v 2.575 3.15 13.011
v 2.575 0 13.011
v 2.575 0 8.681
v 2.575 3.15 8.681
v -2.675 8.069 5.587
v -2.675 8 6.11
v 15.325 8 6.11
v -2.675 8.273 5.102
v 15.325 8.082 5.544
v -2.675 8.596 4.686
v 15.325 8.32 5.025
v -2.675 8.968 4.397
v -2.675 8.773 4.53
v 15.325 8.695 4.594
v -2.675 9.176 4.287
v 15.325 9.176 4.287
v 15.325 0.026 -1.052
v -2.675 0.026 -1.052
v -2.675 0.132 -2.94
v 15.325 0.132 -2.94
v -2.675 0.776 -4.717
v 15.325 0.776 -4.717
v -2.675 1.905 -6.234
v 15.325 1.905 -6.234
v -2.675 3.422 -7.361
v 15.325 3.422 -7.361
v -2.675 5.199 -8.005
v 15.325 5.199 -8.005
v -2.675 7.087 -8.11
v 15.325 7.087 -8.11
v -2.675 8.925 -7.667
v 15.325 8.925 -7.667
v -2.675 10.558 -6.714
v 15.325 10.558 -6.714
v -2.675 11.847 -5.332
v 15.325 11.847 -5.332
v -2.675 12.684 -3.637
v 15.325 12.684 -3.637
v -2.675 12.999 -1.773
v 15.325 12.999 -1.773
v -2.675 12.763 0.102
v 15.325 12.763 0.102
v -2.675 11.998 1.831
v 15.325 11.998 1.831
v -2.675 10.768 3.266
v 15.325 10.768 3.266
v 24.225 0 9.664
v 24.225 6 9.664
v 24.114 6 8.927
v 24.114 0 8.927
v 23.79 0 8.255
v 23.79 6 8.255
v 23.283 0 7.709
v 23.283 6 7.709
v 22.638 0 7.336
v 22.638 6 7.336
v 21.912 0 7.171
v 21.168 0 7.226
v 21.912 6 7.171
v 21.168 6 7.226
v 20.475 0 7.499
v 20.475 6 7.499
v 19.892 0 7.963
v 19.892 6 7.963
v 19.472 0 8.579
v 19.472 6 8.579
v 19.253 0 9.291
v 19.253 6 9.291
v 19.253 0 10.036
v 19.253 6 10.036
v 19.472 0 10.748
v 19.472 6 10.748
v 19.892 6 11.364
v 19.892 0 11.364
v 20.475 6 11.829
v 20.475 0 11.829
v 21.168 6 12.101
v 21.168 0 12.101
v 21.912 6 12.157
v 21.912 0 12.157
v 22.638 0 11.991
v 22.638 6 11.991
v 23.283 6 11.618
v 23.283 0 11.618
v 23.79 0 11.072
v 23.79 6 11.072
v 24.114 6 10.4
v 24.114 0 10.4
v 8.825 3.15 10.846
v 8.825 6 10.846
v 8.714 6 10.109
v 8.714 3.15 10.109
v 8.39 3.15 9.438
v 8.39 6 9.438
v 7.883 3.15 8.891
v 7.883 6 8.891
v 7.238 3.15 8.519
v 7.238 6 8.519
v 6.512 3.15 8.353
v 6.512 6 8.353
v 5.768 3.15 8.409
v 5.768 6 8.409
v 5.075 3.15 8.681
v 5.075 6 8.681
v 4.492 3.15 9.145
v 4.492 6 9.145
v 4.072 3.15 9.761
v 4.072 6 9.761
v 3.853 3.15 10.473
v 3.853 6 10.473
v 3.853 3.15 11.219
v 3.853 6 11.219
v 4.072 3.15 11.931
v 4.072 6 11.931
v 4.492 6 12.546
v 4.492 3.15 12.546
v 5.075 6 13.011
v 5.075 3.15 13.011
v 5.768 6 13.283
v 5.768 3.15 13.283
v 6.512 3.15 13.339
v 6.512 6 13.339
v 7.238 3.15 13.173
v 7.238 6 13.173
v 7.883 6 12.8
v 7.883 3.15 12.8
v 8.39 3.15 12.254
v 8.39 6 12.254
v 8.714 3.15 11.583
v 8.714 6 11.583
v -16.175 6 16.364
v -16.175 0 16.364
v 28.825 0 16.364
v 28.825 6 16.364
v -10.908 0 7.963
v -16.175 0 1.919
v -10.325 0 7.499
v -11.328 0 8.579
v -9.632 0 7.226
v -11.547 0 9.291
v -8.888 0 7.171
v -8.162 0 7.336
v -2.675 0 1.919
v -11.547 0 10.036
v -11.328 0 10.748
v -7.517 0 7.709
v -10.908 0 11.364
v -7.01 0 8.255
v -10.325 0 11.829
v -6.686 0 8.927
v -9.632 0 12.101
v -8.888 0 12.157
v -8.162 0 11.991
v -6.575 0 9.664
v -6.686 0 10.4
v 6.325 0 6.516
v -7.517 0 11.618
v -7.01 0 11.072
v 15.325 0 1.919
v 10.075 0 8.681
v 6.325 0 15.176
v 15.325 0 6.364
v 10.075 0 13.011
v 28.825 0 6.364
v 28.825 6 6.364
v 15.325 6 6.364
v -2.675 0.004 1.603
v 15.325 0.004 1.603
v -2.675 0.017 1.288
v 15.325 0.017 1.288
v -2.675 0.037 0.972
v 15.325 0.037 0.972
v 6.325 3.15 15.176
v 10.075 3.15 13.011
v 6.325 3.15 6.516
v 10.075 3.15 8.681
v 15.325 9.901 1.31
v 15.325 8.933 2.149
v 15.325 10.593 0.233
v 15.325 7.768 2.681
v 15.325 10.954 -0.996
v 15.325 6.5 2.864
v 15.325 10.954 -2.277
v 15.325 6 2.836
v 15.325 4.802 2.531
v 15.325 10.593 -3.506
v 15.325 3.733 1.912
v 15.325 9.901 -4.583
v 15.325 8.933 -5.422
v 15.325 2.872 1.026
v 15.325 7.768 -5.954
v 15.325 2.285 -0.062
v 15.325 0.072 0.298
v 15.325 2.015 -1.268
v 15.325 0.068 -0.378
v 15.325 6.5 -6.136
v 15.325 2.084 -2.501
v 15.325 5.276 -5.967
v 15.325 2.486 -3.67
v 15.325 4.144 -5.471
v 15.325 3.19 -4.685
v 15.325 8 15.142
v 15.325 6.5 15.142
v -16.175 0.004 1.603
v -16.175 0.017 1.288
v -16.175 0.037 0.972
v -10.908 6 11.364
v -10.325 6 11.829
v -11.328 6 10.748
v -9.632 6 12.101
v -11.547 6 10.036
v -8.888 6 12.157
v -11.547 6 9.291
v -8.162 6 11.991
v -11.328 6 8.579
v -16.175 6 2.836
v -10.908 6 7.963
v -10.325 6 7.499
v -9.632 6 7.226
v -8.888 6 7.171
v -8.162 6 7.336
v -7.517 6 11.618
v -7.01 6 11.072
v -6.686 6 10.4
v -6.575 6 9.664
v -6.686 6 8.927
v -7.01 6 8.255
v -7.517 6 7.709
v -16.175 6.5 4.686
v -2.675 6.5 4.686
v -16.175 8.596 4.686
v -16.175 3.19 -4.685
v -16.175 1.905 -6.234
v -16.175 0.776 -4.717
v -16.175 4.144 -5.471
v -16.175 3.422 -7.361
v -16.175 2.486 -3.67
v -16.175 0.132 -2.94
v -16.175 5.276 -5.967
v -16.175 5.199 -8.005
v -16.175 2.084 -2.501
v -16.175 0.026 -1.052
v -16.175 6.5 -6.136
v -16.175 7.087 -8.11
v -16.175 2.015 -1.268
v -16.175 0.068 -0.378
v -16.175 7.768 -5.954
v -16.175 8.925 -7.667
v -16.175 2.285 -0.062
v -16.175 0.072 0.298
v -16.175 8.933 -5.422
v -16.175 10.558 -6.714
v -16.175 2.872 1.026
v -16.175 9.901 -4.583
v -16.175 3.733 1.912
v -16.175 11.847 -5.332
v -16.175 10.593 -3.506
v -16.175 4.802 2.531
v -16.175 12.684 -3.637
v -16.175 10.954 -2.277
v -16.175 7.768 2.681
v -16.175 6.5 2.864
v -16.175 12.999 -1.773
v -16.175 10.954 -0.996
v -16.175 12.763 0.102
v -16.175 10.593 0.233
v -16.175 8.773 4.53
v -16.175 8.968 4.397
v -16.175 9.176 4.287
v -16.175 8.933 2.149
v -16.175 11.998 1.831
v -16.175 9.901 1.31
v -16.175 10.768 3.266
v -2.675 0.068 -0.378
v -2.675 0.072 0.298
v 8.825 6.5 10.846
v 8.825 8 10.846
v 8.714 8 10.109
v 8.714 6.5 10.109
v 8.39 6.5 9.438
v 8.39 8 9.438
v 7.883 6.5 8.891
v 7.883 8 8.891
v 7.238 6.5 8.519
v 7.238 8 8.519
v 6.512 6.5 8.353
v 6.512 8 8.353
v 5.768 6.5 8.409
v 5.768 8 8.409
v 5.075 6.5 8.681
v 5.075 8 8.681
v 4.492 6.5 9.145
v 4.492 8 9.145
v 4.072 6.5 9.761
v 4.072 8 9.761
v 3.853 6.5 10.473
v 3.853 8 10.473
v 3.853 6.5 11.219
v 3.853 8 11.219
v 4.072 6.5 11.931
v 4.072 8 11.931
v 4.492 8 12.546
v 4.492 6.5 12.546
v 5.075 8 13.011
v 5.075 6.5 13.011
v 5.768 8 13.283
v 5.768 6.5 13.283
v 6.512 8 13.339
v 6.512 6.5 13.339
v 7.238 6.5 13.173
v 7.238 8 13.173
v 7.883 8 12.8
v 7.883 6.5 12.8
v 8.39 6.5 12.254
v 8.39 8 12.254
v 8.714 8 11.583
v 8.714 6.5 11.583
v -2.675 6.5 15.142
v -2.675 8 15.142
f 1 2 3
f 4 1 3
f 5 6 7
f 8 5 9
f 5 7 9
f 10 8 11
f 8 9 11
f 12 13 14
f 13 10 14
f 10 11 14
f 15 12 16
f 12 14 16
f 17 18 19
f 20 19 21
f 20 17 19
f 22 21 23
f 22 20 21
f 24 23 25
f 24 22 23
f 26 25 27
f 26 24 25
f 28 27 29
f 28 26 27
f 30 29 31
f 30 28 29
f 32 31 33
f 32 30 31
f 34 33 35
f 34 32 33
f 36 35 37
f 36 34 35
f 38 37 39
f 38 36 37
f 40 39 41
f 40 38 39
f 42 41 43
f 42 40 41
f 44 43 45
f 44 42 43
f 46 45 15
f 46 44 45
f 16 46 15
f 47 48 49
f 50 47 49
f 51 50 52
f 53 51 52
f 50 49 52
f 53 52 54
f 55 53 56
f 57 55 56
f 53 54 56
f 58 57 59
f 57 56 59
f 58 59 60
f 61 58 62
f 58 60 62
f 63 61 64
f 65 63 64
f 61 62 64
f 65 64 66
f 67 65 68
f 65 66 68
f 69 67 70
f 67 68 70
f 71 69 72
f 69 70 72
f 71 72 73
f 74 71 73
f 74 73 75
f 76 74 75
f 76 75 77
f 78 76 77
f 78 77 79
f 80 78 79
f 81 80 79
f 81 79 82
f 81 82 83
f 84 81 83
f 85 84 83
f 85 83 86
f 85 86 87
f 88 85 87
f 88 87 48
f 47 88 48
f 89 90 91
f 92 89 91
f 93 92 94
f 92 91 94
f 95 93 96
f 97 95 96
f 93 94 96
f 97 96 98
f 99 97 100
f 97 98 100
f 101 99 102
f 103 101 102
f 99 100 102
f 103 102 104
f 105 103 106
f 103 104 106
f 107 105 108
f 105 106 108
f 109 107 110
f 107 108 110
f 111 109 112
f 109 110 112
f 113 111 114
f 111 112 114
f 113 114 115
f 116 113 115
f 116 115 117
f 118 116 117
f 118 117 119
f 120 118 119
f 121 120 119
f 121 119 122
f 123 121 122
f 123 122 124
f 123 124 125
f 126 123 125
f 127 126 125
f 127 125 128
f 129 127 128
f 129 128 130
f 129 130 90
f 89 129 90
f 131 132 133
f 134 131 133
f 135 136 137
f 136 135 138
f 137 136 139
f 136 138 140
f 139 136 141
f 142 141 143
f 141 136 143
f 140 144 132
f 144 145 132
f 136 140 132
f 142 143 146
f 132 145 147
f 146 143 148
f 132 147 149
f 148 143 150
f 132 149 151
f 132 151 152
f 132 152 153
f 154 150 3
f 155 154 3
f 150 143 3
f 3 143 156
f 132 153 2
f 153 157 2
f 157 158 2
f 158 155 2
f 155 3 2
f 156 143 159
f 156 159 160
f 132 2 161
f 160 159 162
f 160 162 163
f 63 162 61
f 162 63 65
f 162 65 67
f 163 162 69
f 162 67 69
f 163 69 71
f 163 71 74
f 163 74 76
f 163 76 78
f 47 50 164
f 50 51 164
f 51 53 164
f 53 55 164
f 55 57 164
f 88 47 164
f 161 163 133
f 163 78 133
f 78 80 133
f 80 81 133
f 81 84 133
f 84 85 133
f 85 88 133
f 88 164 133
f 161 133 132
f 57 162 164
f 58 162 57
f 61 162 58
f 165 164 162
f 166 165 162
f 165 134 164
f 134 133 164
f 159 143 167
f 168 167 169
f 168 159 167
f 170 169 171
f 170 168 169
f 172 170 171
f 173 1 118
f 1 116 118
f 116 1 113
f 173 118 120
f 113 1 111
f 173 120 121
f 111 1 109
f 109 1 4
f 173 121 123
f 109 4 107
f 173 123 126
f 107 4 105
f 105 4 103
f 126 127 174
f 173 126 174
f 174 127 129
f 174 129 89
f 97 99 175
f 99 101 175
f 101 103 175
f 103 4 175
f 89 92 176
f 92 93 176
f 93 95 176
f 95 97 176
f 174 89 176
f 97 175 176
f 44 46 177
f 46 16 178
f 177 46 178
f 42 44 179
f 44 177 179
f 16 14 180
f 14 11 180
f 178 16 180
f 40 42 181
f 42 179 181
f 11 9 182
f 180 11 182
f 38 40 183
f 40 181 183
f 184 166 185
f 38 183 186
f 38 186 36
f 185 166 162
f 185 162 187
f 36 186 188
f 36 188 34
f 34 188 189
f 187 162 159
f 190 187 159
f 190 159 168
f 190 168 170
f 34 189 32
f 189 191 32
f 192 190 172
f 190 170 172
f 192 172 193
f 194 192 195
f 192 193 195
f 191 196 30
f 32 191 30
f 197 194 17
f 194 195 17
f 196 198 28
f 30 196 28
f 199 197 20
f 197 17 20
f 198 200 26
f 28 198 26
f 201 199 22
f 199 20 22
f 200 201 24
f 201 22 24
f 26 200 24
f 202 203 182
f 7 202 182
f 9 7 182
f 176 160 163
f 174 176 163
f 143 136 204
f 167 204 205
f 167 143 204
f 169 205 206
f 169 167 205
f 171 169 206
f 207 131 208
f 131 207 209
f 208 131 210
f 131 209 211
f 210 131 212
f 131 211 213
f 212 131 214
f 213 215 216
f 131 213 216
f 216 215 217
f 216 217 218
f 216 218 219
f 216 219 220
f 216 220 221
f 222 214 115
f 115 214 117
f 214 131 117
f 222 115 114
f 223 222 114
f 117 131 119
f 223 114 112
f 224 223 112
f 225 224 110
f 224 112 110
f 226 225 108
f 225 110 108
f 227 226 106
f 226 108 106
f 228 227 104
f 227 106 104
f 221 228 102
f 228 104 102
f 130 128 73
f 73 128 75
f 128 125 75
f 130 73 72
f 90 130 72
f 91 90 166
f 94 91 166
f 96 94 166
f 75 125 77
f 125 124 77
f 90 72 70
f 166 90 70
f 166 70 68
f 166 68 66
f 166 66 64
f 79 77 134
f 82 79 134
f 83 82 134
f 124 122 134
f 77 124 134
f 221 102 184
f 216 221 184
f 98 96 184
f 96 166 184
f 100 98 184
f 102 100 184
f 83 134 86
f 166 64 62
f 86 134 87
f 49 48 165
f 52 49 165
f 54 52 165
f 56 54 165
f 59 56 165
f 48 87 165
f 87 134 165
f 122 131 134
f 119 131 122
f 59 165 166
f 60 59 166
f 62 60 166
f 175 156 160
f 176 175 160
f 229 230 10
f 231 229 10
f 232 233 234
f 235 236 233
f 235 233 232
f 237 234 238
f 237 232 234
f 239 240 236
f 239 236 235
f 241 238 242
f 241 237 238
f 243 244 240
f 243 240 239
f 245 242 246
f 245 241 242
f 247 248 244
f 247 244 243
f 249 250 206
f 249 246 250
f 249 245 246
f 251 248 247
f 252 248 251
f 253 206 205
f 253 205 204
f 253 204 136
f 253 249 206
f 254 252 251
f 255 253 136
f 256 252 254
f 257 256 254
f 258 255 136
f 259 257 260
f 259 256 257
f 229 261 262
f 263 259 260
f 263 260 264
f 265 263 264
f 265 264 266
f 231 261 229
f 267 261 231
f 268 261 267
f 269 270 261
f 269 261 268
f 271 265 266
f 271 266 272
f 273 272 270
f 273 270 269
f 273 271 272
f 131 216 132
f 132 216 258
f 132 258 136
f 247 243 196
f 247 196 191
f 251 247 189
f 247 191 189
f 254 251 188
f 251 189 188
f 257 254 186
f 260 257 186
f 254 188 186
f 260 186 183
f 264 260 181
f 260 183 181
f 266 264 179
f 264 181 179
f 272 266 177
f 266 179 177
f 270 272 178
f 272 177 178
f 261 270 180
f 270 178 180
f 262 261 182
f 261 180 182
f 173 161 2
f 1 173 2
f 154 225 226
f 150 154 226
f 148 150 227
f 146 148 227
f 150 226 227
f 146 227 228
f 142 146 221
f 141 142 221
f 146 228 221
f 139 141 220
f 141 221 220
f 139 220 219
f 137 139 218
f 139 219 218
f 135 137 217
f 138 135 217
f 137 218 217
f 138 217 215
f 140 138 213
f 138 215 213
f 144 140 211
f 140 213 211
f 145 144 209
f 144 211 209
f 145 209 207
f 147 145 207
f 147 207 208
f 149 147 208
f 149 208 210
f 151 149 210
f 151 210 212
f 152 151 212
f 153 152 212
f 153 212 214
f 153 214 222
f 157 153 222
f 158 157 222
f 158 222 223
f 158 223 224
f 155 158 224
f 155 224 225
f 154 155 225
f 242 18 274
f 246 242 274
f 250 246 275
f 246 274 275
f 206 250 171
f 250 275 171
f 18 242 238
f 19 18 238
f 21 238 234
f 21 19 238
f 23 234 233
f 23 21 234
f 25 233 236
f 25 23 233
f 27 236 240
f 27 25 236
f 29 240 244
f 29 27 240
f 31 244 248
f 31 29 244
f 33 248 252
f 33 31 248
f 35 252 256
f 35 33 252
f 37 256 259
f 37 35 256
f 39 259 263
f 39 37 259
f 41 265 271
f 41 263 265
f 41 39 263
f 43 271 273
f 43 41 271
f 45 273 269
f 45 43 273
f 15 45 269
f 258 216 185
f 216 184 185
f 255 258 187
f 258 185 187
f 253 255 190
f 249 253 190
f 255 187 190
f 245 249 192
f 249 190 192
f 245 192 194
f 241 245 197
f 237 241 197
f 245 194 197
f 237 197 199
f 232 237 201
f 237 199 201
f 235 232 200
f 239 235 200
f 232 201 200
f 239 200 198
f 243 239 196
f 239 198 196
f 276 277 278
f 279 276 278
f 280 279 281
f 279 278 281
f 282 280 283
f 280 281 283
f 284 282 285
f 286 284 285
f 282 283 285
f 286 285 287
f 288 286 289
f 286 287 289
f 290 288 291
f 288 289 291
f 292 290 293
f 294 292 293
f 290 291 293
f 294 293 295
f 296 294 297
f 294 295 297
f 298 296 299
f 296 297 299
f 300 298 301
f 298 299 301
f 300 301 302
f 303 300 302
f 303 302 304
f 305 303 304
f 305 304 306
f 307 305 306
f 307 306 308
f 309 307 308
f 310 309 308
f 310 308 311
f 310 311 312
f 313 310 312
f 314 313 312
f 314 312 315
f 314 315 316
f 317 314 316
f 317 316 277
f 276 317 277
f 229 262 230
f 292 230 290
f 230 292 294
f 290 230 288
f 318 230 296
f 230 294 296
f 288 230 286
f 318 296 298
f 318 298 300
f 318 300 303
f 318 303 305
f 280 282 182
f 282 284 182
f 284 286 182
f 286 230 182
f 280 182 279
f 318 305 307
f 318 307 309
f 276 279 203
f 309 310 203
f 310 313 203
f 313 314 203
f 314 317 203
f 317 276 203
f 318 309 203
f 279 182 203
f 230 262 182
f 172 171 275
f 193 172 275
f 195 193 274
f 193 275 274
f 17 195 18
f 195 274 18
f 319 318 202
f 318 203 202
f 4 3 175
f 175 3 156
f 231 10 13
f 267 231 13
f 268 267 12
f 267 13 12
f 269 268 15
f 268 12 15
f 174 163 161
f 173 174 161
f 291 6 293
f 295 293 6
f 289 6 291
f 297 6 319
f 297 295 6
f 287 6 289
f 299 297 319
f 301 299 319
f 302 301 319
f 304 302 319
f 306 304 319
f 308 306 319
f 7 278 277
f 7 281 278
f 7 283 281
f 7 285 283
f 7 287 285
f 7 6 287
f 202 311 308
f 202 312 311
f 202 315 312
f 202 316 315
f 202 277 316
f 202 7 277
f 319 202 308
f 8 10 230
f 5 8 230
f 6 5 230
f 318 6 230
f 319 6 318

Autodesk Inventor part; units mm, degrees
sketch "Sketch1" plane through (0, 0, 0) normal (0, 1, 0) x (-1, 0, 0)
  line L0 (16.1753, 16.3636) -> (-28.8247, 16.3636)
  line L1 (-28.8247, 16.3636) -> (-28.8247, 6.3636)
  line L2 (16.1753, 6.3636) -> (16.1753, 16.3636)
  line L3 (-17.8247, 6.3636) -> (-17.8247, 1.3636)
  line L4 (-17.8247, 1.3636) -> (5.1753, 1.3636)
  line L5 (5.1753, 1.3636) -> (5.1753, 6.3636)
  line L6 (-28.8247, 6.3636) -> (-17.8247, 6.3636)
  line L7 (5.1753, 6.3636) -> (16.1753, 6.3636)
  point P0 (0, 0)
  dimension "d4" = 45
  dimension "d5" = 5
  dimension "d6" = 5
  dimension "d7" = 11
  dimension "d8" = 11
  dimension "d9" = 23
  dimension "d10" = 10
extrude "Extrusion1" add sketch "Sketch1" along normal blind 6
sketch "Sketch4" plane through (17.8247, 0, 6.3636) normal (1, 0, 0) x (0, 0, -1)
  circle A0 centre (8, 6.5) radius 6.5
  line L0 (0, 6) -> (5, 6) projected
  line L1 (0, 0) -> (0, 6) projected
  line L2 (0, 0) -> (5, 0) projected
  line L3 (5, 0) -> (16.9814, 0)
  point P0 (6.3636, 0)
  dimension "d20" = 13
  dimension "d36" = 8
extrude "Extrusion4" add sketch "Sketch4" against normal up to surface (23 mm away) contours A0
fillet "Fillet1" radius 12 2 edges at (6.3247, 0.7337, 1.3636) (6.3247, 0, 1.3636)
sketch "Sketch5" plane through (17.8247, 0, 6.3636) normal (1, 0, 0) x (0, 0, -1)
  circle A0 centre (8, 6.5) radius 6.5 projected
  circle A1 centre (8, 6.5) radius 2.5
  point P0 (6.3636, 0)
  point P1 (1.5193, 6)
  point P2 (7.416, 0.0263)
  dimension "d27" = 5
extrude "Extrusion5" cut sketch "Sketch5" against normal through all contours A1
ref_plane "Work Plane1" through (17.8247, 6.5, -8.1364) normal (0, 0, 1) x (1, 0, 0)
sketch "Sketch6" plane through (0, 6, 0) normal (0, 1, 0) x (1, 0, 0)
  circle A0 centre (-9.0753, -9.6636) radius 2.5
  circle A1 centre (21.7247, -9.6636) radius 2.5
  line L0 (37.8247, 8.1364) -> (-25.1753, 8.1364) projected
  line L1 (28.8247, -16.3636) -> (28.8247, -6.3636) projected
  line L2 (-16.1753, -6.3636) -> (-16.1753, -16.3636) projected
  point P0 (0, 0)
  dimension "d33" = 5
  dimension "d34" = 5
  dimension "d35" = 17.8
  dimension "d37" = 17.8
  dimension "d38" = 7.1
  dimension "d39" = 30.8
  dimension "d40" = 7.1
extrude "Extrusion6" cut sketch "Sketch6" against normal through all
move faces "Move1" translate (-2.5, 0, 0) faces at (17.8247, 2, 4.3758)
move faces "Move2" translate (2.5, 0, 0) faces at (-5.1753, 2, 4.3758) (8.4913, 6.099, -4.104)
sketch "Sketch7" plane through (0, 6, 0) normal (0, 1, 0) x (1, 0, 0)
  line L0 (-2.6753, -4.8444) -> (-2.6753, -6.3636) projected
  line L1 (-2.6753, -4.8444) -> (-2.6753, -14.145)
  line L2 (15.3247, -6.3636) -> (15.3247, -1.9193) projected
  line L3 (15.3247, -4.1415) -> (-2.6753, -4.1415)
  line L4 (-2.6753, -4.1415) -> (-2.6753, -15.1415)
  line L5 (-2.6753, -15.1415) -> (15.3247, -15.1415)
  line L6 (15.3247, -15.1415) -> (15.3247, -4.1415)
  point P0 (0, 0)
  dimension "d52" = 18
  dimension "d53" = 11
extrude "Extrusion7" add sketch "Sketch7" along normal blind 2
fillet "Fillet2" radius 2 1 edges at (6.3247, 8, 4.6882)
ref_plane "Work Plane5" through (0, 6, 0) normal (0, 1, 0) x (1, 0, 0)
sketch "Sketch8" plane through (0, 6, 0) normal (0, 1, 0) x (1, 0, 0)
  line L0 (-2.6753, -0.8636) -> (-2.6753, 4.1364) projected
  line L1 (-2.6753, -15.1415) -> (15.3247, -15.1415) projected
  line L2 (-2.6753, 0) -> (15.3247, 0)
  line L3 (15.3247, 0) -> (15.3247, -15.1415)
  line L4 (15.3247, -15.1415) -> (-2.6753, -15.1415)
  line L5 (-2.6753, -15.1415) -> (-2.6753, 0)
  point P0 (0, 0)
extrude "Extrusion8" cut sketch "Sketch8" along normal blind 0.5
ref_plane "Work Plane6" through (-2.6753, 0, 1.9193) normal (-1, 0, 0) x (0, 0, 1)
sketch "Sketch10" plane through (-2.6753, 0, 1.9193) normal (-1, 0, 0) x (0, 0, 1)
  line L0 (-1.0557, 6.5) -> (13.2222, 6.5) projected
  line L1 (13.2222, 6.5) -> (13.2222, 8) projected
  line L2 (4.1903, 8) -> (13.2222, 8) projected
  arc A0 (2.3677, 9.1765) -> (-2.9717, 0.0263) centre (-3.5557, 6.5) ccw projected
  arc A1 (-0.9468, 0.0374) -> (-2.9717, 0.0263) centre (-1.8936, -11.9252) ccw projected
  arc A2 (-0.9468, 0.0374) -> (0, 0) centre (0, 12) ccw projected
  line L3 (0, 0) -> (4.4443, 0) projected
  line L4 (4.4443, 0) -> (4.4443, 6) projected
  line L5 (4.4443, 6) -> (-1.1062, 6) projected
  arc A3 (-1.0557, 6.5) -> (-1.1062, 6) centre (-3.5557, 6.5) ccw projected
  arc A4 (2.3677, 9.1765) -> (4.1903, 8) centre (4.1903, 10) ccw projected
  point P0 (-1.9193, 0)
extrude "Extrusion9" add sketch "Sketch10" along normal up to surface (13.5 mm away)
sketch "Sketch11" plane through (-2.6753, 0, 1.9193) normal (-1, 0, 0) x (0, 0, 1)
  line L0 (2.7662, 9.2202) -> (17.7662, 9.2202)
  line L1 (17.7662, 9.2202) -> (17.7662, 6.2202)
  line L2 (17.7662, 6.2202) -> (2.7662, 6.2202)
  line L3 (2.7662, 6.2202) -> (2.7662, 9.2202)
  point P0 (-1.9193, 0)
  point P1 (-3.5557, 6.5)
  dimension "d82" = 15
  dimension "d83" = 3
sketch "Sketch12" plane through (15.3247, 0, 6.3636) normal (1, 0, 0) x (0, 0, -1)
  arc A0 (3.5, 6.5) -> (3.5, 6.5) centre (8, 6.5) ccw
  line L0 (3.5, 6.5) -> (3.5, 6.5)
  circle A1 centre (8, 6.5) radius 2.5
  circle A2 centre (8, 6.5) radius 4.5
  point P0 (6.3636, 0)
  dimension "d72" = 2
sketch "Sketch13" plane through (0, 8, 0) normal (0, 1, 0) x (1, 0, 0)
  line L0 (15.3247, -6.4035) -> (-2.6753, -6.4035) projected
  line L1 (15.3247, -15.1415) -> (15.3247, -0.8636) projected
  line L2 (-2.6753, -14.1415) -> (-2.6753, -2.35) projected
  circle A0 centre (6.3247, -10.8459) radius 2.5
  point P0 (0, 0)
  point P1 (15.3247, -3.7322)
  dimension "d68" = 5
extrude "Extrusion12" cut sketch "Sketch13" against normal through all
extrude "Extrusion13" cut sketch "Sketch12" against normal through all
extrude "Extrusion15" cut sketch "Sketch11" along normal up to surface (13.5 mm away)
ref_plane "Work Plane7" through (0, 0, 0) normal (0, 1, 0) x (1, 0, 0)
sketch "Sketch14" plane through (0, 0, 0) normal (0, 1, 0) x (1, 0, 0)
  circle A0 centre (6.3247, -10.8459) radius 2.5 projected
  line L0 (10.0747, -8.6808) -> (10.0747, -13.0109)
  line L1 (10.0747, -13.0109) -> (6.3247, -15.176)
  line L2 (6.3247, -15.176) -> (2.5747, -13.0109)
  line L3 (2.5747, -13.0109) -> (2.5747, -8.6808)
  line L4 (2.5747, -8.6808) -> (6.3247, -6.5157)
  line L5 (6.3247, -6.5157) -> (10.0747, -8.6808)
  line L6 (15.3247, -15.1415) -> (15.3247, -6.1096) projected
  point P0 (0, 0)
  dimension "d89" = 7.5
extrude "Extrusion16" cut sketch "Sketch14" along normal blind 3.15
properties part number "Cerniera 3"
